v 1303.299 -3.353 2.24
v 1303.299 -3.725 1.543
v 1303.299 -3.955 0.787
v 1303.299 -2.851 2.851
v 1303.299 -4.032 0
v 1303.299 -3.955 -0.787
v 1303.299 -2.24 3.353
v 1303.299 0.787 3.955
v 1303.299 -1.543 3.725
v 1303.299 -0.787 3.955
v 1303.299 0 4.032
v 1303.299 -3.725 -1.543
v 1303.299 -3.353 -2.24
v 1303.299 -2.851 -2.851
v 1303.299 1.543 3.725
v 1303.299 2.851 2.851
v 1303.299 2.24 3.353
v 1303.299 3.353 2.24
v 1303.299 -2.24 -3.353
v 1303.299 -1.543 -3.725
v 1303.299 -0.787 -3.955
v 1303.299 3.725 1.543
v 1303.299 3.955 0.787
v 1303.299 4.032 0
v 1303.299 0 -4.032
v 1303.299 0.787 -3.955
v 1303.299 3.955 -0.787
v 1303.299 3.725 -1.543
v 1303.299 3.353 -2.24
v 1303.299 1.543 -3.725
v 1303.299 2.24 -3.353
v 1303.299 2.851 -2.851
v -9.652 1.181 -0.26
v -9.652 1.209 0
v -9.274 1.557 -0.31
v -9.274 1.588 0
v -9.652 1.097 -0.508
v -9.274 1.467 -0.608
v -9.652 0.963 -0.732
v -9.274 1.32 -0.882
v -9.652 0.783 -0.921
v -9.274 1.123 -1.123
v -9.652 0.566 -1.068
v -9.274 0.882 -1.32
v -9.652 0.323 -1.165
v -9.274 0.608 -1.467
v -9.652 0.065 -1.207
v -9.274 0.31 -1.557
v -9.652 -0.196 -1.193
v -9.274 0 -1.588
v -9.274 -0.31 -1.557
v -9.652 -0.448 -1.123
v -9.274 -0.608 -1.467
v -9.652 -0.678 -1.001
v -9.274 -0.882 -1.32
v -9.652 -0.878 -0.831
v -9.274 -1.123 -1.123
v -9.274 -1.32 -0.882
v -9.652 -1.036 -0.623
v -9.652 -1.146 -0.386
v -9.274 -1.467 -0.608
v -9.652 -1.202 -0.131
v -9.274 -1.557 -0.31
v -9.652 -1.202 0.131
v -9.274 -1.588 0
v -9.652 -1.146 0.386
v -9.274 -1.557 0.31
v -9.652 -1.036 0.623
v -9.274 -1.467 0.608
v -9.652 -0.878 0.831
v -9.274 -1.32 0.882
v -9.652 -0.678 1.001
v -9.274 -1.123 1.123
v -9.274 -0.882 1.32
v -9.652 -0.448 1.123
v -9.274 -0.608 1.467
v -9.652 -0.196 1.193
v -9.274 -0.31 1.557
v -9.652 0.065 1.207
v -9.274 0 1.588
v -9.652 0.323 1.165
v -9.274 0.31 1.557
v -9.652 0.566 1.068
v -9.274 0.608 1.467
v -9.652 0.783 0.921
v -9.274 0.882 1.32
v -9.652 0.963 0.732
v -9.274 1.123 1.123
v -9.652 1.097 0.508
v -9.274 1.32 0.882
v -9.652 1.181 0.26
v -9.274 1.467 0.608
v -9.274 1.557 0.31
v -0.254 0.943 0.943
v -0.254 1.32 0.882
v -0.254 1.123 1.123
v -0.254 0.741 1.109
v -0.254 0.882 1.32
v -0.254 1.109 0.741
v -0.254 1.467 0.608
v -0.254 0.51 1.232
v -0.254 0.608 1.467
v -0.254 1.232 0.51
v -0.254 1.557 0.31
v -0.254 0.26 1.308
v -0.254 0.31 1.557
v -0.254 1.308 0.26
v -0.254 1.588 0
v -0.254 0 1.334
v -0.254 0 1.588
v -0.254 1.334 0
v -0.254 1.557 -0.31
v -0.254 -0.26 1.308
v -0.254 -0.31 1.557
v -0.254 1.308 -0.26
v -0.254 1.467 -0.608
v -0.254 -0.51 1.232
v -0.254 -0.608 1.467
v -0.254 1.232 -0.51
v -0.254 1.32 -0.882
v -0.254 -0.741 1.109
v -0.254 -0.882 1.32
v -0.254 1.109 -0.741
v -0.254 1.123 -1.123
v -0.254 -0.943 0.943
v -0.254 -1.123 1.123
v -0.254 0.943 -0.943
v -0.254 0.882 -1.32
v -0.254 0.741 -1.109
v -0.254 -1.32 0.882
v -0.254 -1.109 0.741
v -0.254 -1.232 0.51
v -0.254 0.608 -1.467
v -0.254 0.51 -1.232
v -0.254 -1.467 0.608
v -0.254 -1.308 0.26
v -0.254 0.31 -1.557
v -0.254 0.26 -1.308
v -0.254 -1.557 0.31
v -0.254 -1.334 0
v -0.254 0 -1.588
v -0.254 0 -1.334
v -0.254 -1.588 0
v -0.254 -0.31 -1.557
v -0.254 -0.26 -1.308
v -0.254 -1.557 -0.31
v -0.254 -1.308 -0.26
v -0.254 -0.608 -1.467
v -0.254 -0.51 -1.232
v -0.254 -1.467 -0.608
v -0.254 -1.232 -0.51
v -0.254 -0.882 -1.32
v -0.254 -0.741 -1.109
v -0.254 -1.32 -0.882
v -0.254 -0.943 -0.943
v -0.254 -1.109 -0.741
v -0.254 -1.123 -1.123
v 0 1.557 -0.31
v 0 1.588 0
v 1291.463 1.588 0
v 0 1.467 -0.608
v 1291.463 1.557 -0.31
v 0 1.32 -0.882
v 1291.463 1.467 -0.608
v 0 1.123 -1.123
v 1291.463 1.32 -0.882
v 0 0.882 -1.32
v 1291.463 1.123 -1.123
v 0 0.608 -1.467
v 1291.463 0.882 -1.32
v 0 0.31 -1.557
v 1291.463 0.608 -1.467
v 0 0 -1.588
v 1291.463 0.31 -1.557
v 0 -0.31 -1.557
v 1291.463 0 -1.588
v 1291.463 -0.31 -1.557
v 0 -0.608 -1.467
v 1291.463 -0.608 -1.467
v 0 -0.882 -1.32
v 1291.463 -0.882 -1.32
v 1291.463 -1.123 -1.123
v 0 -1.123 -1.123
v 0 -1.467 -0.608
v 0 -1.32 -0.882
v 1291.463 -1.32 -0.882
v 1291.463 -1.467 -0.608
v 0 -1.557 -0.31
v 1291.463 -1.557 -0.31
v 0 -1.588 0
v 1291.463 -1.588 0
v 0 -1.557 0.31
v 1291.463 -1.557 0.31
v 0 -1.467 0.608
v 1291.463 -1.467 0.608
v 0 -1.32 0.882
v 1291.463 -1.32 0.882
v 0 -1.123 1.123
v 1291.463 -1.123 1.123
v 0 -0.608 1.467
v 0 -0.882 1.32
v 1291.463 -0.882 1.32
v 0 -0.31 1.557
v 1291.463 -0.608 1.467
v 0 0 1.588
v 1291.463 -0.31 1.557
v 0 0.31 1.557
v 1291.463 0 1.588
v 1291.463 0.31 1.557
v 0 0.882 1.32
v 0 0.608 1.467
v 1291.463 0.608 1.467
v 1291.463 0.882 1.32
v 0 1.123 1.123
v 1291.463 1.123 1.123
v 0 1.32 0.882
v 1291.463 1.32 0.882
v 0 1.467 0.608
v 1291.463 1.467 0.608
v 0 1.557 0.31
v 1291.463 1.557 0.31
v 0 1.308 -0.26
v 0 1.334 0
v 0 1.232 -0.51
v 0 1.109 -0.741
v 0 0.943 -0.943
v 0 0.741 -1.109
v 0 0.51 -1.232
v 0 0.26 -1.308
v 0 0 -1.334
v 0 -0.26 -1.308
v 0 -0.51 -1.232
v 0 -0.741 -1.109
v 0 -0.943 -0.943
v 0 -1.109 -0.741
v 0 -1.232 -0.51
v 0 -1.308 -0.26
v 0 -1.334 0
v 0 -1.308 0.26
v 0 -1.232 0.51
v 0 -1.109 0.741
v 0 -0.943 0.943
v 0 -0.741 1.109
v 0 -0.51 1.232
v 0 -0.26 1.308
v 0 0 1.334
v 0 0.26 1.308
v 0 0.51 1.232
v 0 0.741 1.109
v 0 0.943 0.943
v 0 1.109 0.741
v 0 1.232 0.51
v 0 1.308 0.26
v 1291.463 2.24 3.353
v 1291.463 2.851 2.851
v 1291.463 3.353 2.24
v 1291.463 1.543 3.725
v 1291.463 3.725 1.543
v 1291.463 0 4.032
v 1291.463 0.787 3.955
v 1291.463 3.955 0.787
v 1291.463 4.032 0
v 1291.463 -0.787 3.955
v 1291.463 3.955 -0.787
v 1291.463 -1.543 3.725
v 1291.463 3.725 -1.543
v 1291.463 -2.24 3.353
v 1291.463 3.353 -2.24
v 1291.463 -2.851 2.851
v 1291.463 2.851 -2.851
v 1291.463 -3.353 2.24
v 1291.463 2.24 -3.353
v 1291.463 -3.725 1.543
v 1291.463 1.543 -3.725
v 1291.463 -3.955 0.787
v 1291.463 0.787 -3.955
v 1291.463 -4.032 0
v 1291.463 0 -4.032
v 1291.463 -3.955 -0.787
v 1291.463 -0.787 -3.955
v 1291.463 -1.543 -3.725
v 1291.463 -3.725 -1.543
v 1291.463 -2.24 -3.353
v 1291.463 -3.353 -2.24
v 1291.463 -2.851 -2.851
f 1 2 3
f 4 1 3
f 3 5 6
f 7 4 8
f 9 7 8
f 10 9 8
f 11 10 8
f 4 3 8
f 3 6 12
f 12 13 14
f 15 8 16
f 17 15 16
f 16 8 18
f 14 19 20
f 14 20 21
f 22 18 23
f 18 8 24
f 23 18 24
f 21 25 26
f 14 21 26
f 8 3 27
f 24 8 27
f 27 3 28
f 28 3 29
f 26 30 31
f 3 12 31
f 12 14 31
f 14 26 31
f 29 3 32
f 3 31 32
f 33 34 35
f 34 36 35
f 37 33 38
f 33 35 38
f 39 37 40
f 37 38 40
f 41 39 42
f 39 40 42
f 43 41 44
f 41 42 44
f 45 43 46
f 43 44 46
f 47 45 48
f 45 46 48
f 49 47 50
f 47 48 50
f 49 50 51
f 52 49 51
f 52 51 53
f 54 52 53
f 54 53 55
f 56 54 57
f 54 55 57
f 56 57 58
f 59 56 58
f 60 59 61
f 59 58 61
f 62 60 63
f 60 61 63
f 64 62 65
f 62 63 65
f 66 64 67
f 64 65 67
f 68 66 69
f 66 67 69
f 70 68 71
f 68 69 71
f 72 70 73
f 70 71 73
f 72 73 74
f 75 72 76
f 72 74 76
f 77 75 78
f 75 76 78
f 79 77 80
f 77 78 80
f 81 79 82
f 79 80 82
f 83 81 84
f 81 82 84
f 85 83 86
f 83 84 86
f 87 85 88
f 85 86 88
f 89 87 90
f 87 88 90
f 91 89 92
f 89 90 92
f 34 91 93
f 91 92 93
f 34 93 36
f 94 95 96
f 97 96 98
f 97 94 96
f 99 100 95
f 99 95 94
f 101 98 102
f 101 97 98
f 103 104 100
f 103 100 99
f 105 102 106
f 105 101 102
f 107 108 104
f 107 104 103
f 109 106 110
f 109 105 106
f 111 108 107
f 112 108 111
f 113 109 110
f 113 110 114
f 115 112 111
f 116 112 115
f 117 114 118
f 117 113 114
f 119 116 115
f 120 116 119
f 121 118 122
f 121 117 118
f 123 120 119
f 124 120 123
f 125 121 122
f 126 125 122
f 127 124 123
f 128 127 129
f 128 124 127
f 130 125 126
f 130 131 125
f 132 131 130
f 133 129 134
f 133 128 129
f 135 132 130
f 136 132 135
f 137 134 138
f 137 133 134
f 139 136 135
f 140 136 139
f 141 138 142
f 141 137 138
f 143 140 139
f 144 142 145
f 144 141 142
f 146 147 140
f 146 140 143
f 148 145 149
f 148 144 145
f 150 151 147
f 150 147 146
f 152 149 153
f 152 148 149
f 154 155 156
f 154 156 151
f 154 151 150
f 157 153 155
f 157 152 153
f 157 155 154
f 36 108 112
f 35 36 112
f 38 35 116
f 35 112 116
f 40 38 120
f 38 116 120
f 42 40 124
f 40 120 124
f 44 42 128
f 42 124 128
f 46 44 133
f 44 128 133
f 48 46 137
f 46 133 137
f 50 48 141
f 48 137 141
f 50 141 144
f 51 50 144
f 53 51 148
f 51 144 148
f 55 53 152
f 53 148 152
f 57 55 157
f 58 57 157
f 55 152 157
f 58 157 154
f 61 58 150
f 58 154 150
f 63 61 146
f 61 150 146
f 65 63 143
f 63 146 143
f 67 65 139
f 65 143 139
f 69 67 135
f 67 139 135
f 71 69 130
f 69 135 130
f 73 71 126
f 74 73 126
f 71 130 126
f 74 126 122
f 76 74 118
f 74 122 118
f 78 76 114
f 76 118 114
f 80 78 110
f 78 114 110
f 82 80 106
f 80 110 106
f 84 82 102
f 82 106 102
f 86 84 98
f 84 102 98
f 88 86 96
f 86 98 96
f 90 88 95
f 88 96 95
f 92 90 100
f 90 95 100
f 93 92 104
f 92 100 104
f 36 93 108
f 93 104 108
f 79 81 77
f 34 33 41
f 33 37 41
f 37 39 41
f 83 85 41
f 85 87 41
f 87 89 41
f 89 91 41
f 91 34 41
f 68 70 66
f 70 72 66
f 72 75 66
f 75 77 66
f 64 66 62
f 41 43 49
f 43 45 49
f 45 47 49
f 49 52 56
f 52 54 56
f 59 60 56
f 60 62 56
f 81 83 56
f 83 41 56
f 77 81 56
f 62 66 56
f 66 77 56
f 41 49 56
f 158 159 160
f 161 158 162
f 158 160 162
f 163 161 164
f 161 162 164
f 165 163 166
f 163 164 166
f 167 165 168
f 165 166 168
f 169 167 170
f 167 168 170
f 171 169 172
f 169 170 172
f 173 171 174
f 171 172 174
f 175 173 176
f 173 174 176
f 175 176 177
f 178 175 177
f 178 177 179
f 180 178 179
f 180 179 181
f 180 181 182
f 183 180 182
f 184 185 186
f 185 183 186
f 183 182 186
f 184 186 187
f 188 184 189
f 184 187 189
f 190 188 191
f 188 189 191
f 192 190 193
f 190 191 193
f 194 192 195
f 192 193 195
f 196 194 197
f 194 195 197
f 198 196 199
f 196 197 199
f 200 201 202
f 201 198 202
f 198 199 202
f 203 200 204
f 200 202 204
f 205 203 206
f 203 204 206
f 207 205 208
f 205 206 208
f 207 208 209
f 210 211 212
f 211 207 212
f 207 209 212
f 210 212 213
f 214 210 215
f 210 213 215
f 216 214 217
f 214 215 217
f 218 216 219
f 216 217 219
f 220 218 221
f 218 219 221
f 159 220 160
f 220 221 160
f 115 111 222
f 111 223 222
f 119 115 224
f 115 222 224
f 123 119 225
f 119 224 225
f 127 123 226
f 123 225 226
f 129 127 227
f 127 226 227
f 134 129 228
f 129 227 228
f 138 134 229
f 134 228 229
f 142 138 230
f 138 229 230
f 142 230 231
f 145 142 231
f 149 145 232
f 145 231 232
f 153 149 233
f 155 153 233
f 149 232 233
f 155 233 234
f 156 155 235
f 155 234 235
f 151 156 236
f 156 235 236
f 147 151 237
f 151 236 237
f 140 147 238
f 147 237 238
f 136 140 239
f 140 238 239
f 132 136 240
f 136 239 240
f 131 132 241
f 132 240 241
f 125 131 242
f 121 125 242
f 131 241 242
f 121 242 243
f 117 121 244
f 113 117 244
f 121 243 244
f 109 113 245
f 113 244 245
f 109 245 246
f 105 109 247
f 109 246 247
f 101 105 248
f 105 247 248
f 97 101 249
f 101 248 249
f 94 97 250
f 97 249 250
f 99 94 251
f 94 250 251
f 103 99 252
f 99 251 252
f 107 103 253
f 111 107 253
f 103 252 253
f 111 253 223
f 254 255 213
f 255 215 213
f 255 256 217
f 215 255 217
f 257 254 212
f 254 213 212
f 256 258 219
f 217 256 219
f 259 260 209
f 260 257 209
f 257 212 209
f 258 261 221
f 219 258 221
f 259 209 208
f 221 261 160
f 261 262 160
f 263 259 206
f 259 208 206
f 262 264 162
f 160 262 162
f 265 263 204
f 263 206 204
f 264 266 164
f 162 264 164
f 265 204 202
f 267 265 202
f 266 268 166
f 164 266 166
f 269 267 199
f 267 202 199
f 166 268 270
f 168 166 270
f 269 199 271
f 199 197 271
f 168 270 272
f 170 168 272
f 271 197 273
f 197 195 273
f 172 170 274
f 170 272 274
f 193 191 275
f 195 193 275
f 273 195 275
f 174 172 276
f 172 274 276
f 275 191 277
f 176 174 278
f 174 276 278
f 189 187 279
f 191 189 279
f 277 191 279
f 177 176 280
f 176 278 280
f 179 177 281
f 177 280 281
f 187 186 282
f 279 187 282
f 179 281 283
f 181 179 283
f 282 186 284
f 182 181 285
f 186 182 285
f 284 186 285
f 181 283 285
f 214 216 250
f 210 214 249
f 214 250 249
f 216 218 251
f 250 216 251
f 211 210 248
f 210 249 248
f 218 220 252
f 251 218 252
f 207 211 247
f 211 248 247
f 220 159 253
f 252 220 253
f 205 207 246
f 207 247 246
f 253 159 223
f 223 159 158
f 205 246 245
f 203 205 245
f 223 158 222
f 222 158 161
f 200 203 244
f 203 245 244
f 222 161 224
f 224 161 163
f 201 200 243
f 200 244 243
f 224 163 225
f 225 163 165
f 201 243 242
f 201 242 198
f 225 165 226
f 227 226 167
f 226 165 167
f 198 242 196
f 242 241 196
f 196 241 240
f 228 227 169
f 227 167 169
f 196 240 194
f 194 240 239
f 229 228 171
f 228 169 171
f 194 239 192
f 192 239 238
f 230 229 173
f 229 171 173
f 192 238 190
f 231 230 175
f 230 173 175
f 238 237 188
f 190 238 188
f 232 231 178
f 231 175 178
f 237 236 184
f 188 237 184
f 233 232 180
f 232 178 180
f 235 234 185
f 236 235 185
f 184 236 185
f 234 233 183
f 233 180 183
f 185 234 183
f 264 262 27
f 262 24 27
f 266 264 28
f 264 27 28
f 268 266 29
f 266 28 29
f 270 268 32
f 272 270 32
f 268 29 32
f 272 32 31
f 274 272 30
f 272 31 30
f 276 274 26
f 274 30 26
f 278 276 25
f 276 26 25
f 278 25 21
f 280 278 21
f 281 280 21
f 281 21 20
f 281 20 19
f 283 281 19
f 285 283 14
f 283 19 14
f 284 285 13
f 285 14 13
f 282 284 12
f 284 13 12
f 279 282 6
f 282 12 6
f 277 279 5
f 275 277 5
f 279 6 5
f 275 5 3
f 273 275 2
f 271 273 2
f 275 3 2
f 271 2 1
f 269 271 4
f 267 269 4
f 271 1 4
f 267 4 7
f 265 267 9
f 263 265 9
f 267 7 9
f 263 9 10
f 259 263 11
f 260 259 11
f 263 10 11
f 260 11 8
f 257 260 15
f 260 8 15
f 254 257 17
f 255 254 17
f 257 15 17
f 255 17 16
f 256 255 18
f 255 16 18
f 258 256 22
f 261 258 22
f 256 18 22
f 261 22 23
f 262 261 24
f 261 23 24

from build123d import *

# Parameters (mm, degrees)
SKETCH3_W = 0.254
SKETCH3_H = 0.508


with BuildPart() as part:
    # Sketch1 → Revolve1 (revolve)
    with BuildSketch(Plane.XY):
        Polygon((0, 0), (0, 1.5875), (1291.463, 1.5875), (1291.463, 4.03225), (1303.2994, 4.03225), (1303.2994, 0), align=None)
    revolve(axis=Axis((1303.2994, 0, 0), (-1, 0, 0)))

    # Sketch2 → Revolve2 (revolve)
    with BuildSketch(Plane.XY):
        Polygon((-9.652, 0), (-9.652, 1.20904), (-9.27354, 1.5875), (0, 1.5875), (0, 0), align=None)
    revolve(axis=Axis((0, 0, 0), (-1, 0, 0)))

    # Sketch3 → Cut-Revolve1 (revolve, cut)
    with BuildSketch(Plane.XY):
        with Locations((-0.127, 1.5875)):
            Rectangle(SKETCH3_W, SKETCH3_H)
    revolve(axis=Axis((0, 0, 0), (-1, 0, 0)), mode=Mode.SUBTRACT)


solid = part.part
